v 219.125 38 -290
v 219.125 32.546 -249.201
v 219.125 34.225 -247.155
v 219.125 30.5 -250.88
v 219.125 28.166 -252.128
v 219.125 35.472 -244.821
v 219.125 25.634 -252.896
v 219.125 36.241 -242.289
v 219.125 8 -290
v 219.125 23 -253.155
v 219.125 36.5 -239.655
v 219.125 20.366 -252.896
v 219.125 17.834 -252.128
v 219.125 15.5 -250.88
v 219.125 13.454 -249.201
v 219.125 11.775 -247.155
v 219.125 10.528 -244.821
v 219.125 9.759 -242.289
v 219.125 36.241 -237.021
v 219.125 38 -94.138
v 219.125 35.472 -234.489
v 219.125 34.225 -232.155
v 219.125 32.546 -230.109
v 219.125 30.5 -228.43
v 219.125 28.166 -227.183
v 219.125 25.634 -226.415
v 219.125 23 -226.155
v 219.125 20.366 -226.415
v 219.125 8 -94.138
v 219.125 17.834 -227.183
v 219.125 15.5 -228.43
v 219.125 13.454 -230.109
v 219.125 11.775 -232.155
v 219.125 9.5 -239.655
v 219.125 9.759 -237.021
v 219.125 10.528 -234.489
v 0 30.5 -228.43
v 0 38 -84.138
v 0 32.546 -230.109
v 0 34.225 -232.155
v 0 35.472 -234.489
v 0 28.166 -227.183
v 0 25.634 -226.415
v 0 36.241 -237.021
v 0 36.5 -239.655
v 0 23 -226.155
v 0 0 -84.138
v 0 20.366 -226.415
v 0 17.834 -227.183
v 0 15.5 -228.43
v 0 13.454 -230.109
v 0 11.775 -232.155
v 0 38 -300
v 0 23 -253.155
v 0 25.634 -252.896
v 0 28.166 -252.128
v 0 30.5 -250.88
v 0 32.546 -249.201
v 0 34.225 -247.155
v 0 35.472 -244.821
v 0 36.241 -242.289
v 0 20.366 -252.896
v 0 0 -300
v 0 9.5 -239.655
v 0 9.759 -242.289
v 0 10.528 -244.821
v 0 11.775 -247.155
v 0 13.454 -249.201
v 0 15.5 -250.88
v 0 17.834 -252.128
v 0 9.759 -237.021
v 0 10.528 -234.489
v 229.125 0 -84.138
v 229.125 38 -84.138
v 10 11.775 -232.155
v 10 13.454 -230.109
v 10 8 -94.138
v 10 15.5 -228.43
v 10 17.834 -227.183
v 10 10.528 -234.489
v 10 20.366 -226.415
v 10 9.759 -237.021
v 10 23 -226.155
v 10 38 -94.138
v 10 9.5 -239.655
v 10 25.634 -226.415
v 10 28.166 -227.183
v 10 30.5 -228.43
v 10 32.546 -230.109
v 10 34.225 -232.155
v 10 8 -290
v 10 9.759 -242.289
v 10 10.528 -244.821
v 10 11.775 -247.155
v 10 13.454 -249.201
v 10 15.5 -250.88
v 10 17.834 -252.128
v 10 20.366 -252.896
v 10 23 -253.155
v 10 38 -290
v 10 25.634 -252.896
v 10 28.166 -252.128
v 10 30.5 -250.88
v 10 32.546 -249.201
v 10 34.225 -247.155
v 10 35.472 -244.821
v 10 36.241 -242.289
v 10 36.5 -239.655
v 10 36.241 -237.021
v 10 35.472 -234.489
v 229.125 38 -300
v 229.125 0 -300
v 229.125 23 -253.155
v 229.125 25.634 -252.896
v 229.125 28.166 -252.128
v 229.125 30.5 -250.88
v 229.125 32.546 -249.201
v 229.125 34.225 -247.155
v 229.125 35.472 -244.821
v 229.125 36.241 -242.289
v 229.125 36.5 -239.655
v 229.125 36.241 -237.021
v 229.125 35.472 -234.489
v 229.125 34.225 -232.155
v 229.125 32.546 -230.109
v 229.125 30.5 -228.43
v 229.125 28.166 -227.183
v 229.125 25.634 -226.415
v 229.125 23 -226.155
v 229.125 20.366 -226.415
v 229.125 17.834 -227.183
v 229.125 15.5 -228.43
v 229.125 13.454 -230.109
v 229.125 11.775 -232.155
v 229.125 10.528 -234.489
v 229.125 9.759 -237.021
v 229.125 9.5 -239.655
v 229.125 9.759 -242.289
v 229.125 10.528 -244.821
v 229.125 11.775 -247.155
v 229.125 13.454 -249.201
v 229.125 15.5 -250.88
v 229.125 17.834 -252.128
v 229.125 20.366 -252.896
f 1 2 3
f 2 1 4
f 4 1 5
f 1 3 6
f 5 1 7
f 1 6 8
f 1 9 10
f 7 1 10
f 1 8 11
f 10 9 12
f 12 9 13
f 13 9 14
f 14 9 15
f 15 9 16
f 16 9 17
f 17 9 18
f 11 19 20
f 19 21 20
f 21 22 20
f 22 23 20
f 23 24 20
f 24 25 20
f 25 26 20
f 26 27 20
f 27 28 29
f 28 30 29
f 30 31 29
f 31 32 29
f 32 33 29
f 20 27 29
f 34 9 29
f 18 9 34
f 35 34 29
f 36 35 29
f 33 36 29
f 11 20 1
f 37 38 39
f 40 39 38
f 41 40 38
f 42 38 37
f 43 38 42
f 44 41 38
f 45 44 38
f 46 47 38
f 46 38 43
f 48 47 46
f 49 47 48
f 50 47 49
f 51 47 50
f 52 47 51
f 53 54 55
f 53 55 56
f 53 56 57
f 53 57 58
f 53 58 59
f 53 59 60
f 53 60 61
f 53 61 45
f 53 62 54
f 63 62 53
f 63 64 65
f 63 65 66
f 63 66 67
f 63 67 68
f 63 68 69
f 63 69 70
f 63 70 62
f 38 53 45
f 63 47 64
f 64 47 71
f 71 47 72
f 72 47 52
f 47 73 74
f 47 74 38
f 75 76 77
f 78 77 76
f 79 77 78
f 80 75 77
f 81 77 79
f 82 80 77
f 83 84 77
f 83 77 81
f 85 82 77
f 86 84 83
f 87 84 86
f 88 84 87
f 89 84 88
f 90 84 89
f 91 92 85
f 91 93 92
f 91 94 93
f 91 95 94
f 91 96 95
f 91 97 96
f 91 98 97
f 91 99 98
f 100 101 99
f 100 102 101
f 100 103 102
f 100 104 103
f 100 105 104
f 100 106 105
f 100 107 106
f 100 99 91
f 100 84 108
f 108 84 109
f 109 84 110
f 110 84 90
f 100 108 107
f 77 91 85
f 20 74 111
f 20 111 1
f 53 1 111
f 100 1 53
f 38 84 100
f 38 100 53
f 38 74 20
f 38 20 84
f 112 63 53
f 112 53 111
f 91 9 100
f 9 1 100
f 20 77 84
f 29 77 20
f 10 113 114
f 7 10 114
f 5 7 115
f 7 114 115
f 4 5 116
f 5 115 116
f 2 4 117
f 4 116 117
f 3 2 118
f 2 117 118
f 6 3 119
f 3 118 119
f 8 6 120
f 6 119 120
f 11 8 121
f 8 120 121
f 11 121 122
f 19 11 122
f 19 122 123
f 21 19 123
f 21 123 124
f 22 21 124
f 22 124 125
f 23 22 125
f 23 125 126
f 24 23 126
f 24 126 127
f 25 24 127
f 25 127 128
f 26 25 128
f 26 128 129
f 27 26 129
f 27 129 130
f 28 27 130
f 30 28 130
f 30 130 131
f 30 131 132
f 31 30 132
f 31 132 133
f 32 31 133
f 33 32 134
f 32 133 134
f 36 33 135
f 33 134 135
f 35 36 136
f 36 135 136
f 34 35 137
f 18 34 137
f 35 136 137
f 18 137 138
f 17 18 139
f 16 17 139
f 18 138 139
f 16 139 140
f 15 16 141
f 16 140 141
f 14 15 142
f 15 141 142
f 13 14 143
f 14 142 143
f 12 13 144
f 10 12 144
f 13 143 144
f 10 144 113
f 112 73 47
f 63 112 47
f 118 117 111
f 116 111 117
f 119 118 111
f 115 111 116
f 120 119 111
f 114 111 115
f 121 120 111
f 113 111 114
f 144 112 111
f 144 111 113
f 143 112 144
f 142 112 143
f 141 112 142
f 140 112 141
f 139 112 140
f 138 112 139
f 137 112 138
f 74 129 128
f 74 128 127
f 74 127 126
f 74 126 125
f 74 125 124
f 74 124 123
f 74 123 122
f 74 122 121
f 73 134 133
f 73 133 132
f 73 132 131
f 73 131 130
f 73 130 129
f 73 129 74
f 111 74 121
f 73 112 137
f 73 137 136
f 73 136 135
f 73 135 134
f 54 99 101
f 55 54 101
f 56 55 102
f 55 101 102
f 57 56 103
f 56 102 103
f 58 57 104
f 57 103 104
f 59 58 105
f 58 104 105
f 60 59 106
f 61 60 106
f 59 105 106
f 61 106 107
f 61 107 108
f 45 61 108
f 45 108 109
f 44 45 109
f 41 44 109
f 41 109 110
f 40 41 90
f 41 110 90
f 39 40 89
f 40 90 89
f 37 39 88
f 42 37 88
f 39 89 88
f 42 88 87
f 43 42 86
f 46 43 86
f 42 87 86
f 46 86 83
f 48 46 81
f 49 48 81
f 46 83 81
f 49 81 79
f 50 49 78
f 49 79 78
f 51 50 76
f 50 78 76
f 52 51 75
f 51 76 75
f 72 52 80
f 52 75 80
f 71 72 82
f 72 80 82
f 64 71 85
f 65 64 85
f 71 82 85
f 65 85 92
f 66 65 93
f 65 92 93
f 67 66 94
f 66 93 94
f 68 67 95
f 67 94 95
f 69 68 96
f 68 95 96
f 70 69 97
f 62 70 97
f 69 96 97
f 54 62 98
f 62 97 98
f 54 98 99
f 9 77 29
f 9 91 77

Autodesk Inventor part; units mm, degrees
ref_plane "YZ Plane" through (0, 0, 0) normal (1, 0, 0) x (0, 1, 0)
ref_plane "XZ Plane" through (0, 0, 0) normal (0, 1, 0) x (-1, 0, 0)
ref_plane "XY Plane" through (0, 0, 0) normal (0, 0, 1) x (1, 0, 0)
sketch "Sketch1" plane through (0, 0, 0) normal (0, 1, 0) x (-1, 0, 0)
  line L0 (0, 0) -> (0, -250)
  line L1 (-200, 0) -> (0, 0)
  line L2 (0, -250) -> (0, -300)
  line L3 (0, -300) -> (-200, -300)
  line L4 (-200, -300) -> (-230, -300)
  line L5 (-230, 0) -> (-200, 0)
  line L6 (-230, -300) -> (-245, -300)
  line L7 (-245, -300) -> (-245, 0)
  line L8 (-245, 0) -> (-230, 0)
  dimension "d0" = 250
  dimension "d4" = 50
  dimension "d12" = 30
  dimension "d24" = 15
extrude "Extrusion1" add sketch "Sketch1" along normal blind 38
sketch "Sketch2" plane through (0, 38, 0) normal (0, 1, 0) x (1, 0, 0)
  line L0 (0, 300) -> (0, 0) projected
  line L1 (0, 0) -> (245, 0) projected
  line L2 (10, 10) -> (10, 290)
  line L3 (245, 300) -> (0, 300) projected
  line L4 (245, 0) -> (245, 300) projected
  line L5 (245, 290) -> (235, 290)
  line L6 (235, 290) -> (235, 10)
  line L7 (235, 290) -> (10, 290)
  line L8 (0, 300) -> (0, 0) projected
  line L9 (235, 10) -> (10, 10)
  dimension "d25" = 10
extrude "Extrusion2" cut sketch "Sketch2" against normal blind 30 contours L2 L7 L6 L9
move faces "Move1" translate (0, 0, -84.138) faces at (81.6667, 25.3333, 0)
move faces "Move2" translate (-15.875, 0, 0) faces at (245, 25.3333, -156.092)
sketch "Sketch15" plane through (0, 8, 0) normal (0, 1, 0) x (1, 0, 0)
  line L0 (10, 84.138) -> (10, 290) projected
  line L1 (10, 84.138) -> (10, 94.138)
  line L2 (10, 94.138) -> (219.125, 94.138)
  line L3 (229.125, 290) -> (229.125, 84.138) projected
  line L4 (229.125, 290) -> (219.125, 290)
  line L5 (10, 290) -> (229.125, 290) projected
  line L6 (219.125, 290) -> (219.125, 94.138)
  line L7 (10, 84.138) -> (229.125, 84.138)
  line L8 (229.125, 290) -> (229.125, 84.138)
  point P0 (0, 0)
  dimension "d42" = 10
  dimension "d43" = 10
extrude "Extrusion5" add sketch "Sketch15" along normal blind 30 contours L0 L2 L6 L4 L3 L7
sketch "Sketch16" plane through (229.125, 0, -84.138) normal (1, 0, 0) x (0, 0, -1)
  line L0 (10, 8) -> (205.862, 8) projected
  line L1 (155.5172, 8) -> (155.5172, 38)
  line L2 (215.862, 38) -> (0, 38) projected
  circle A0 centre (155.5172, 23) radius 13.5
  point P0 (-84.138, 0)
  dimension "d46" = 27
extrude "Extrusion6" cut sketch "Sketch16" against normal blind 235
equation "\"BendRadius\" = Thickness"
equation "\"BendReliefWidth\" = Thickness"
equation "\"BendReliefDepth\" = 0.5 * Thickness"
equation "\"CornerReliefSize\" = 4 * Thickness"
equation "\"MinimumRemnant\" = 2 * Thickness"
equation "\"TransitionRadius\" = BendRadius"
equation "\"JacobiRadiusSize\" = BendRadius"
equation "\"GapSize\" = Thickness"
equation "\"Thickness\" = 3.048"
properties part number "Case_3d_model_3DPrint"
